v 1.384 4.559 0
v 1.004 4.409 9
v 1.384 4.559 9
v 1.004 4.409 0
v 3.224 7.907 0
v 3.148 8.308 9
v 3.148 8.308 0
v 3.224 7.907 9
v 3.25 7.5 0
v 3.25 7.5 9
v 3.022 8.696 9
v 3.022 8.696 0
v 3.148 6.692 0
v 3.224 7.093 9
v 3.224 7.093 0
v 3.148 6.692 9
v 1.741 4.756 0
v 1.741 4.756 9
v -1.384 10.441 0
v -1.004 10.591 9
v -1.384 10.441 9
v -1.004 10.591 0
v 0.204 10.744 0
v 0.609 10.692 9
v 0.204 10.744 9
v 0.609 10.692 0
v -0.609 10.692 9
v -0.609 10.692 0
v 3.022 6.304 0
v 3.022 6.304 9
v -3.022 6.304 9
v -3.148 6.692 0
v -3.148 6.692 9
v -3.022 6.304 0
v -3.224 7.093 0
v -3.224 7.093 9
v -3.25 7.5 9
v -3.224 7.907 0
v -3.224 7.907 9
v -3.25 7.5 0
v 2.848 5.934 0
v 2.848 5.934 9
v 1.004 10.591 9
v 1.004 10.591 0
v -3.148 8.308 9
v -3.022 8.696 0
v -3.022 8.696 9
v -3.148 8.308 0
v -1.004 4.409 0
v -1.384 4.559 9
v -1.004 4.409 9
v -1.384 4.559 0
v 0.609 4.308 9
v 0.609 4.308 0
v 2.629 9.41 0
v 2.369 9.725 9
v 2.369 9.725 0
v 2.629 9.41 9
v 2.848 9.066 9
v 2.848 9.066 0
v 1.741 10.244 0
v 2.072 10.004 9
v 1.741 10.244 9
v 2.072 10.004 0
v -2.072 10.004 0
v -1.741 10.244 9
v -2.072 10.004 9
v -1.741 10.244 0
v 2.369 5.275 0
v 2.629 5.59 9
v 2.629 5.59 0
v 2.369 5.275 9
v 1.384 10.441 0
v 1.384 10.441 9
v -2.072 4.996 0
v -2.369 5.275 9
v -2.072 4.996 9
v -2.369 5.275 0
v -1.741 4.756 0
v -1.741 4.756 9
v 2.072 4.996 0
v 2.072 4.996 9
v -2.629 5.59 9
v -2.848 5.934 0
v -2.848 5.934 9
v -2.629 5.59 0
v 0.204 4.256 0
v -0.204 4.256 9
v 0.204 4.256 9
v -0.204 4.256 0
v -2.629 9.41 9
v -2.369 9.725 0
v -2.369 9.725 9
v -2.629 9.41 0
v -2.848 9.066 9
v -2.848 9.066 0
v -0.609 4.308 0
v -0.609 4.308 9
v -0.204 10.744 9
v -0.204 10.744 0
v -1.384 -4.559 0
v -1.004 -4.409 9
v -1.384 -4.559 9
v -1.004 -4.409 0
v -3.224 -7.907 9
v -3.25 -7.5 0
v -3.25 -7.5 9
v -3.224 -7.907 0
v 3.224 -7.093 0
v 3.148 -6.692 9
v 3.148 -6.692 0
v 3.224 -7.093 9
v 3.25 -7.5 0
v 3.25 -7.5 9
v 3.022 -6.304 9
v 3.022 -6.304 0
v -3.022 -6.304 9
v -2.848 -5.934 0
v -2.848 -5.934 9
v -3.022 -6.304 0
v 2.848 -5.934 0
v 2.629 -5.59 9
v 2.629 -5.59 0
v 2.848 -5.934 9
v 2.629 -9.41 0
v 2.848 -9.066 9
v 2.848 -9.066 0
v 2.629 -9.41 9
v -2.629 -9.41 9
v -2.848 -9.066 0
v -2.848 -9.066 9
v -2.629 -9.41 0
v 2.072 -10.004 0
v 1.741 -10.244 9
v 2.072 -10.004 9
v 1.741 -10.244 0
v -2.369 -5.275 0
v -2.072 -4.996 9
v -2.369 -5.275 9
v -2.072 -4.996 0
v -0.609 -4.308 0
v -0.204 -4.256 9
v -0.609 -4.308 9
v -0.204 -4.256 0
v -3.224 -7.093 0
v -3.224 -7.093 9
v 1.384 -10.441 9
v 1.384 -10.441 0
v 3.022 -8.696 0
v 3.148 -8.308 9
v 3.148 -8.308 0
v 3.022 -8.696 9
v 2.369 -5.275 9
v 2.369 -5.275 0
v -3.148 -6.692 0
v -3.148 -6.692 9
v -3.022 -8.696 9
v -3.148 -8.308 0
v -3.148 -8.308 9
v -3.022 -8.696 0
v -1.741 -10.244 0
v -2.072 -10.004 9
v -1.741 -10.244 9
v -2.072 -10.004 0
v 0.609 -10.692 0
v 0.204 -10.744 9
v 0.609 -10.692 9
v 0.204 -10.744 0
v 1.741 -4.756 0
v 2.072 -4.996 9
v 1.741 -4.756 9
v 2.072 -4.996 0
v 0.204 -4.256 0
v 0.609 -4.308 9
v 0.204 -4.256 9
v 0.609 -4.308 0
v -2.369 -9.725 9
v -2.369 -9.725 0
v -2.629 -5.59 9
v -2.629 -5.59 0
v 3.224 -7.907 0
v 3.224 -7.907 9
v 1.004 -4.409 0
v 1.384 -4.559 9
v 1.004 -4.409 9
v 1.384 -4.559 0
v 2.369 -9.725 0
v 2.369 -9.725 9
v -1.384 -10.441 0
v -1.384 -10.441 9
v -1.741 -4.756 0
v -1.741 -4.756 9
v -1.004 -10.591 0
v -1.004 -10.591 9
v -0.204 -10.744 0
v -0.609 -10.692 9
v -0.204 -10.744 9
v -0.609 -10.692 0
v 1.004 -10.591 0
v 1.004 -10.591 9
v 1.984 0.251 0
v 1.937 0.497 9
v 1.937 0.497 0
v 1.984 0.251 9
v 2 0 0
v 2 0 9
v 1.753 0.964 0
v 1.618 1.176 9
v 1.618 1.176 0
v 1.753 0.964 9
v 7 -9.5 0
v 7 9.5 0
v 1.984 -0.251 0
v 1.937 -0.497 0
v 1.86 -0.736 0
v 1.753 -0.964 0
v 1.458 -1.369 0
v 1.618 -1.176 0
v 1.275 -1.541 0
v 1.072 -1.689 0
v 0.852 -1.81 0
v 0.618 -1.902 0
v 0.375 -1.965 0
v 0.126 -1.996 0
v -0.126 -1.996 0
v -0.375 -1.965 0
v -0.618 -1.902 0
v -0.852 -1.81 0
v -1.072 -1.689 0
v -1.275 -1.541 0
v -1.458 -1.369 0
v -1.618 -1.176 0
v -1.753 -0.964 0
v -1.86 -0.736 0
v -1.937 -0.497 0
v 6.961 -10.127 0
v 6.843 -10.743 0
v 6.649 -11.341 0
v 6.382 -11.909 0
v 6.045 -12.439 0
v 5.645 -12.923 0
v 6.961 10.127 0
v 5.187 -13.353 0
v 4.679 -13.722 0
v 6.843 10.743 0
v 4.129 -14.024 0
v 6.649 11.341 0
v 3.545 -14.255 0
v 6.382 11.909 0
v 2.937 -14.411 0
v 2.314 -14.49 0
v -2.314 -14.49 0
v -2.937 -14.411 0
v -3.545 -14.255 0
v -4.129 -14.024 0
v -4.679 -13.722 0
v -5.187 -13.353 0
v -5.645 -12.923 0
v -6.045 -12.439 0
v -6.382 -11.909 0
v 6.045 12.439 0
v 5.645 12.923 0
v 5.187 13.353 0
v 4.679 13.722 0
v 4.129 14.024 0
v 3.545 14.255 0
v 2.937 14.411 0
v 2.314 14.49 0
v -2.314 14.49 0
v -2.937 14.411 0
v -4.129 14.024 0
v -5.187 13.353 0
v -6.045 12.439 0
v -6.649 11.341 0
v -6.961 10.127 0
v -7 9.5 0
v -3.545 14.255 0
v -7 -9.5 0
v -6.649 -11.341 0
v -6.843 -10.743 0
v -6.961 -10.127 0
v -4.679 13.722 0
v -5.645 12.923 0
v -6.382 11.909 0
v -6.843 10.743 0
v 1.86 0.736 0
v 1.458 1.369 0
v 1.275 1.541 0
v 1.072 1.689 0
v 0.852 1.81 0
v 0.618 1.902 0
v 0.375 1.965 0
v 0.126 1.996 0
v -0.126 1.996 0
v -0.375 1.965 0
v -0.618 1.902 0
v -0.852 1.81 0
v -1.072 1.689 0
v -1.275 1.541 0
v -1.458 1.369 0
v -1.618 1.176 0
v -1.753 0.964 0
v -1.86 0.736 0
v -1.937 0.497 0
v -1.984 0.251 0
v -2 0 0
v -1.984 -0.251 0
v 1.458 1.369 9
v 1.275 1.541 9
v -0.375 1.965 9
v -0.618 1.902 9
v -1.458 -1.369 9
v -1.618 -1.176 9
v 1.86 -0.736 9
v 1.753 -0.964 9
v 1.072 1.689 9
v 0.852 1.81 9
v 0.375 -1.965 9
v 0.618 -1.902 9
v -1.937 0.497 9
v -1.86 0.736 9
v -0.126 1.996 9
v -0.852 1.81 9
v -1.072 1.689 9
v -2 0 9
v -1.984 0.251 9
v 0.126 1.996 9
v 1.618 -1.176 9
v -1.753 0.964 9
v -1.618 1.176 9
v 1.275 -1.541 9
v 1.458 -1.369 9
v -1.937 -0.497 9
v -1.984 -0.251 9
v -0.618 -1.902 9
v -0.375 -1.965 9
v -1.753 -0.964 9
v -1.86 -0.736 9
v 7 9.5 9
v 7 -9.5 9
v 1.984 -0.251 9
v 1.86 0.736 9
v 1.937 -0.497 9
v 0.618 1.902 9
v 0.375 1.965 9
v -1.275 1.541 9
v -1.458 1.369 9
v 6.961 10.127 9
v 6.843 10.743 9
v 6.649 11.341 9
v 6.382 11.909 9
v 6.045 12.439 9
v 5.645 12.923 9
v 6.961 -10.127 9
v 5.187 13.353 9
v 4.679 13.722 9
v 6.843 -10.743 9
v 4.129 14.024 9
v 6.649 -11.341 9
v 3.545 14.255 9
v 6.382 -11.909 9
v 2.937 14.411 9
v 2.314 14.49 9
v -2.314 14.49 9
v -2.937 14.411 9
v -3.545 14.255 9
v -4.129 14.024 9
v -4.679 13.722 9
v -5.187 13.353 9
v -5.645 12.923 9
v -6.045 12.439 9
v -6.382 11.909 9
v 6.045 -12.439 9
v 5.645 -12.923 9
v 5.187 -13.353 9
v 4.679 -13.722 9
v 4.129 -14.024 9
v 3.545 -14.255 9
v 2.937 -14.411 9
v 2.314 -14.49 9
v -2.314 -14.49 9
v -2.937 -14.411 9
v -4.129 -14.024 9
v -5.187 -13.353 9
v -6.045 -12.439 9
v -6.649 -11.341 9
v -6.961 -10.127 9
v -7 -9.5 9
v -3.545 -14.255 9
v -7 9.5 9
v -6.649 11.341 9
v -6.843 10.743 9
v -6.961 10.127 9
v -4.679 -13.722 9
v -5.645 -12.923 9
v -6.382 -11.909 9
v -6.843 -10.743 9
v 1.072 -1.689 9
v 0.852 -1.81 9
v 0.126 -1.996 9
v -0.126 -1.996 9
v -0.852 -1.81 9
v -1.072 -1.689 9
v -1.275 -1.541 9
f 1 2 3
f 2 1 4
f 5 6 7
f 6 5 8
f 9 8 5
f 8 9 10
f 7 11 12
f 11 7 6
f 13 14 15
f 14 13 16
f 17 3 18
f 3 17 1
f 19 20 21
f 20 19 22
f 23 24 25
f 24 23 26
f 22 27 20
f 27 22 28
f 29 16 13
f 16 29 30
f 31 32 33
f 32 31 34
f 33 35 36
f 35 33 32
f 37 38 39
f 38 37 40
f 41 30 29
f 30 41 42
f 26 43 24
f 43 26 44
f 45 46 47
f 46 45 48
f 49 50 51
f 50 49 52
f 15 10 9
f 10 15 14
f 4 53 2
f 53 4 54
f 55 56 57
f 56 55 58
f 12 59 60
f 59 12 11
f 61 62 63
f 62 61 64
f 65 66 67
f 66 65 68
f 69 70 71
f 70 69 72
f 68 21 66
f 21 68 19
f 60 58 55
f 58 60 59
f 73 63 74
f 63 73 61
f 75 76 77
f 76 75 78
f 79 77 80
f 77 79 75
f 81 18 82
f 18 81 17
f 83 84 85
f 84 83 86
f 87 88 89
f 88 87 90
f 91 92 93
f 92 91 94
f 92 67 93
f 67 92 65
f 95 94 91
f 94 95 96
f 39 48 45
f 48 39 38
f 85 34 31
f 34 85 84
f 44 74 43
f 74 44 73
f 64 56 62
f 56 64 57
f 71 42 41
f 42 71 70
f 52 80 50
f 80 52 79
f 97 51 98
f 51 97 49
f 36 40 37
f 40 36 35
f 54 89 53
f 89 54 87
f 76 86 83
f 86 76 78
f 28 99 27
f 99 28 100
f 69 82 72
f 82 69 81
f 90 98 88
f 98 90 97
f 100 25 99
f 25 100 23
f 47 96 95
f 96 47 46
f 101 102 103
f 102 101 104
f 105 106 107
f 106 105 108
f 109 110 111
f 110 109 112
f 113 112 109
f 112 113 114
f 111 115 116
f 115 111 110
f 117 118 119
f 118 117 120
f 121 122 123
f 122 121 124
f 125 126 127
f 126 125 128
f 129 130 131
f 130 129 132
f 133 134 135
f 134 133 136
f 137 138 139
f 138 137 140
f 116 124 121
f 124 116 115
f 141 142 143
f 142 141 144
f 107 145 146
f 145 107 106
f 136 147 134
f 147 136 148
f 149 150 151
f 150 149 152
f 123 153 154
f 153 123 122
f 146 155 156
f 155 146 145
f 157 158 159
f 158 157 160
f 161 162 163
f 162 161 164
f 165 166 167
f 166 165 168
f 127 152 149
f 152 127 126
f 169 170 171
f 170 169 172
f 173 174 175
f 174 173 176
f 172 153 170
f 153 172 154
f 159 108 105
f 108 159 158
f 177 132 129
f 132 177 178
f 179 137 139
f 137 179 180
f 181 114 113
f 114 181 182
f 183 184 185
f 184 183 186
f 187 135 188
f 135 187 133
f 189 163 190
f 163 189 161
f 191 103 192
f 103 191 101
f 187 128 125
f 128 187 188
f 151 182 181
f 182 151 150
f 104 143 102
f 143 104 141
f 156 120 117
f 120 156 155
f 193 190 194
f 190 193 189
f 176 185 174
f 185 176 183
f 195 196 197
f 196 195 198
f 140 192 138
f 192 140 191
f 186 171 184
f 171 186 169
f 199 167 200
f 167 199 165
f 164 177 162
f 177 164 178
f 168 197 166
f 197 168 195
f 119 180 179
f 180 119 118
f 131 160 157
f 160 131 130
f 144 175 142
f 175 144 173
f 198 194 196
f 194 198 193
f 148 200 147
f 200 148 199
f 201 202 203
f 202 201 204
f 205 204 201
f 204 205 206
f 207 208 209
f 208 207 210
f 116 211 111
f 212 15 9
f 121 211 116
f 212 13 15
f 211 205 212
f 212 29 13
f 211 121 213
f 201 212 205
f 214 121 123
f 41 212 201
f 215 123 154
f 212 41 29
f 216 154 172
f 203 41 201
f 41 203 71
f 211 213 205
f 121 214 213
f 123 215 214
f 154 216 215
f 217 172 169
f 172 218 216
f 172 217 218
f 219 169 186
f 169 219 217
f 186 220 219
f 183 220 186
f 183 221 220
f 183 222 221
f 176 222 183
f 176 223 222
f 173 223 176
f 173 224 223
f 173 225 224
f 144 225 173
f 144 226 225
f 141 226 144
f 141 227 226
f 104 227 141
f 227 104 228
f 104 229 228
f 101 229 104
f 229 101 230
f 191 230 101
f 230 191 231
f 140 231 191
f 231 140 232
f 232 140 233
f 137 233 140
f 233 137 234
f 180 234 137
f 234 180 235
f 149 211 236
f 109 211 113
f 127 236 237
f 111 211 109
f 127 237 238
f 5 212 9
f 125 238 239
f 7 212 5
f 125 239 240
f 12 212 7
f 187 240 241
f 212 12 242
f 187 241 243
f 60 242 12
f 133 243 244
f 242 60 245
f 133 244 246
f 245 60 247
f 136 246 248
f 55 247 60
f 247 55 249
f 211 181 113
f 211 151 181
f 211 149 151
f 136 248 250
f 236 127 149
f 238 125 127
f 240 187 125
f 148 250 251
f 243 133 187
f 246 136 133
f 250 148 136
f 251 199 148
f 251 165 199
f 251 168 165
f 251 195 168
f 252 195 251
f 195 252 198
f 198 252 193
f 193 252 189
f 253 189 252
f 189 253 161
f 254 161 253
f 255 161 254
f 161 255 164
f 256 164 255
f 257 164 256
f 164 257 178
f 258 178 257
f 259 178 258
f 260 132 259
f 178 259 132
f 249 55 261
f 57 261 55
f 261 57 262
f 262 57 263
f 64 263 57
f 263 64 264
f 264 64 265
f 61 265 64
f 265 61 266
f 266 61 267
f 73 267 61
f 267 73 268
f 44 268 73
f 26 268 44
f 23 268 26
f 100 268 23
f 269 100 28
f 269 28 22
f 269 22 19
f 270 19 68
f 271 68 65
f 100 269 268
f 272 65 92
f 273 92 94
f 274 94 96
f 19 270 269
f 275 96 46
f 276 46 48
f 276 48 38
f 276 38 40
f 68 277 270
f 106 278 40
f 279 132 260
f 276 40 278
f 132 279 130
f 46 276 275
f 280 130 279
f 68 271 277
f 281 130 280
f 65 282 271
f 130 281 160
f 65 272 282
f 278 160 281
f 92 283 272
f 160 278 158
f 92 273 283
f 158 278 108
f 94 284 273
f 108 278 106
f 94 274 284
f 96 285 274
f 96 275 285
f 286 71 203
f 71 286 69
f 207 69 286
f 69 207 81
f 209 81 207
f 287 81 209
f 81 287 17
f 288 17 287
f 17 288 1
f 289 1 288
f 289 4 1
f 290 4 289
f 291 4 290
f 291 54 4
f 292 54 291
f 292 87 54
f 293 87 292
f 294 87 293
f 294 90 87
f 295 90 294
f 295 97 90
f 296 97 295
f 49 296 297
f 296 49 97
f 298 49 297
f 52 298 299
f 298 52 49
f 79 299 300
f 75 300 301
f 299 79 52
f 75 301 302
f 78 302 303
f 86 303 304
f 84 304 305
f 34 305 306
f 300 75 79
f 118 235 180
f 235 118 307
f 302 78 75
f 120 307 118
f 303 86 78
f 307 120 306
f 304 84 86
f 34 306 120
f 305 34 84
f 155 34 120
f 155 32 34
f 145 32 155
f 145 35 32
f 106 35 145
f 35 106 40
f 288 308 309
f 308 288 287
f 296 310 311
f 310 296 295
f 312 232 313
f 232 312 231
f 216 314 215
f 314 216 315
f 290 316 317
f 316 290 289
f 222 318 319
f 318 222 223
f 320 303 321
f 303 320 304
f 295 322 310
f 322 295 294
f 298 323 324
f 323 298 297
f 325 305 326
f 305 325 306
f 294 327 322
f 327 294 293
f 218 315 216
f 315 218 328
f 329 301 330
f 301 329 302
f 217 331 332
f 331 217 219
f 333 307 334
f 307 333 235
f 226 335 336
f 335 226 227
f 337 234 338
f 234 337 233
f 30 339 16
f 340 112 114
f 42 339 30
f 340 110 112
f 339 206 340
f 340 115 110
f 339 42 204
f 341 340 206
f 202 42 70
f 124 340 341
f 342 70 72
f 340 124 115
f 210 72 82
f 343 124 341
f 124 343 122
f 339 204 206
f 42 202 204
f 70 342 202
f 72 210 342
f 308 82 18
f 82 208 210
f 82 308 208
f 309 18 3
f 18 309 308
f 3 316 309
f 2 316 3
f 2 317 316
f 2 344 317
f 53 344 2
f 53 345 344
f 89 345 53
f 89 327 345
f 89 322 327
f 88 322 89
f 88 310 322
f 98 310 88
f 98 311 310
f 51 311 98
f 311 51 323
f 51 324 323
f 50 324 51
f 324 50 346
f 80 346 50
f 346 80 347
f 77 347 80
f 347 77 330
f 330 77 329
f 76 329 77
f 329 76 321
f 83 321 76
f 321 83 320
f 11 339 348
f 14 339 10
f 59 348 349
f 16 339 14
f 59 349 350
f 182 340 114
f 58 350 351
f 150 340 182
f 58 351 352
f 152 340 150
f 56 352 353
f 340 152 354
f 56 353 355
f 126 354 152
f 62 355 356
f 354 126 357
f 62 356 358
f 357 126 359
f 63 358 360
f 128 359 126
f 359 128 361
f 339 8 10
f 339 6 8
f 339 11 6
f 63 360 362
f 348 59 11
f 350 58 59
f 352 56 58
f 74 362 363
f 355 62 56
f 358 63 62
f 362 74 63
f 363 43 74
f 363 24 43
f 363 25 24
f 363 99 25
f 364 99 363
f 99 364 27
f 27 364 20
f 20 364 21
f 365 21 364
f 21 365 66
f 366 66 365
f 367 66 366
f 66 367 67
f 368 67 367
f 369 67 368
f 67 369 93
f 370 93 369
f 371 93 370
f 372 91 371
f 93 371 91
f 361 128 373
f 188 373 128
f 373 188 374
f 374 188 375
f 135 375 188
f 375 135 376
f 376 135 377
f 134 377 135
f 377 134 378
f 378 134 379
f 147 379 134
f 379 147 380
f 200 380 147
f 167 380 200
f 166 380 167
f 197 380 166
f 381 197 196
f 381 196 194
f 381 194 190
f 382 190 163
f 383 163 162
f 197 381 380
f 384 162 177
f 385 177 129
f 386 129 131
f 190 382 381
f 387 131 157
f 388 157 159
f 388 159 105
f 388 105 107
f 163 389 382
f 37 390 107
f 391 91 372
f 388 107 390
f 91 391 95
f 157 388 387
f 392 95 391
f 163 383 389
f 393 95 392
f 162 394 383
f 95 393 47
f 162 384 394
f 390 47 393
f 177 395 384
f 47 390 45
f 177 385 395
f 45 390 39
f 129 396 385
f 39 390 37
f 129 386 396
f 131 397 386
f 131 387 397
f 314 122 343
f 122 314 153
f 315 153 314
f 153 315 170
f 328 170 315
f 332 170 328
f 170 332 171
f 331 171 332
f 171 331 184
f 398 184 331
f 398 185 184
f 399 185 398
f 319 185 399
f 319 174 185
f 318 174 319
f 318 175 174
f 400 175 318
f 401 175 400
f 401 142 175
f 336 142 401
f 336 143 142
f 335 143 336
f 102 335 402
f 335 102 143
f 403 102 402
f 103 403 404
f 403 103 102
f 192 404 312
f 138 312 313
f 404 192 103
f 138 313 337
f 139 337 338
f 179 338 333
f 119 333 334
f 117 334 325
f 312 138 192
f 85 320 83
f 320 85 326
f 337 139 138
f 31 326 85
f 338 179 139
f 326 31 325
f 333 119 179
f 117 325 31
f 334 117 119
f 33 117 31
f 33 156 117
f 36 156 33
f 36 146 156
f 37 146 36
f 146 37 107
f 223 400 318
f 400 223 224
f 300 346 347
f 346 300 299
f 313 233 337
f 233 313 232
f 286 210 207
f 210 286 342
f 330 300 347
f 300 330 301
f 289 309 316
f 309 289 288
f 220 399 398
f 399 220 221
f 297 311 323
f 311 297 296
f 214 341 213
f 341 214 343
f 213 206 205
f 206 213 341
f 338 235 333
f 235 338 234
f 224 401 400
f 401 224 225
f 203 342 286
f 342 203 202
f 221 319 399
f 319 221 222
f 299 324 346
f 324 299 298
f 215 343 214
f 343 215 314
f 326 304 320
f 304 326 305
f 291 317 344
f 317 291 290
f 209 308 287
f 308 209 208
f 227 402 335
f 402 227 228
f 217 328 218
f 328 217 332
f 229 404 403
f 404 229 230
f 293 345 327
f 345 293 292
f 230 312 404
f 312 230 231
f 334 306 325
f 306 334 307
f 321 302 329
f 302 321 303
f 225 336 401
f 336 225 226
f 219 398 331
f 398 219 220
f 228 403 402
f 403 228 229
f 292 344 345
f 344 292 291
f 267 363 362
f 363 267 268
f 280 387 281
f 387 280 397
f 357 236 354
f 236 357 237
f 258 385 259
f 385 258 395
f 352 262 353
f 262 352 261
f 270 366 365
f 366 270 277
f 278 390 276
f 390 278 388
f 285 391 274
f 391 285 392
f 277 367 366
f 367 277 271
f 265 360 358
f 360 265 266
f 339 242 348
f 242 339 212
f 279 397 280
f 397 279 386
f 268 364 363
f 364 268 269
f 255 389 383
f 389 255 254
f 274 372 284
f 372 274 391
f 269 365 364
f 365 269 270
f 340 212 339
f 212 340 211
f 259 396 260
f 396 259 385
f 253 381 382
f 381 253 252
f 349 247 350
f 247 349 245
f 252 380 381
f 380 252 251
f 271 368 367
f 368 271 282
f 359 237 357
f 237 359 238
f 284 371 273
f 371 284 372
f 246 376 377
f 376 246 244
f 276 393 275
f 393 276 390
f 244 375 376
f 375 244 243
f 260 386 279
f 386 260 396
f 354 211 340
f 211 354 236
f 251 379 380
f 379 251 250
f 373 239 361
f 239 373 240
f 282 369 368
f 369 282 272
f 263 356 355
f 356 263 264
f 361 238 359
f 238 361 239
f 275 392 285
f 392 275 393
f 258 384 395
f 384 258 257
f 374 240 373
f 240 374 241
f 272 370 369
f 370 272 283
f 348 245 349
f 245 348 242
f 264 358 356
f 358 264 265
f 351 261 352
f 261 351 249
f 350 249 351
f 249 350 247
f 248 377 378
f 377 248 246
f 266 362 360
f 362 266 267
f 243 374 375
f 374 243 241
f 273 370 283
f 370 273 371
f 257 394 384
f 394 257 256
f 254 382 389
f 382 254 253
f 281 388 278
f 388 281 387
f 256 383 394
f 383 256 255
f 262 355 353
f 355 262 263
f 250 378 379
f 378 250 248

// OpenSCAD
$fn = 50;


difference() {
	union() {
		hull() {
			translate(v = [-2.0000000000, 9.5000000000, 0]) {
				cylinder(h = 9, r = 5);
			}
			translate(v = [2.0000000000, 9.5000000000, 0]) {
				cylinder(h = 9, r = 5);
			}
			translate(v = [-2.0000000000, -9.5000000000, 0]) {
				cylinder(h = 9, r = 5);
			}
			translate(v = [2.0000000000, -9.5000000000, 0]) {
				cylinder(h = 9, r = 5);
			}
		}
	}
	union() {
		#translate(v = [0.0000000000, 7.5000000000, 0]) {
			cylinder(h = 9, r = 3.2500000000);
		}
		#translate(v = [0.0000000000, -7.5000000000, 0]) {
			cylinder(h = 9, r = 3.2500000000);
		}
		#translate(v = [0.0000000000, -7.5000000000, -100.0000000000]) {
			cylinder(h = 200, r = 3.2500000000);
		}
		#translate(v = [0.0000000000, -7.5000000000, -100.0000000000]) {
			cylinder(h = 200, r = 3.2500000000);
		}
		#translate(v = [0.0000000000, 7.5000000000, -100.0000000000]) {
			cylinder(h = 200, r = 3.2500000000);
		}
		#translate(v = [0.0000000000, 7.5000000000, -100.0000000000]) {
			cylinder(h = 200, r = 3.2500000000);
		}
		#translate(v = [0.0000000000, 7.5000000000, 0]) {
			cylinder(h = 9, r = 1.8000000000);
		}
		#translate(v = [0.0000000000, -7.5000000000, 0]) {
			cylinder(h = 9, r = 1.8000000000);
		}
		#translate(v = [0.0000000000, 7.5000000000, 0]) {
			cylinder(h = 9, r = 1.8000000000);
		}
		#translate(v = [0.0000000000, -7.5000000000, 0]) {
			cylinder(h = 9, r = 1.8000000000);
		}
		#translate(v = [0.0000000000, 7.5000000000, 0]) {
			cylinder(h = 9, r = 1.8000000000);
		}
		#translate(v = [0.0000000000, -7.5000000000, 0]) {
			cylinder(h = 9, r = 1.8000000000);
		}
		#cylinder(h = 9, r = 2.0000000000);
	}
}
